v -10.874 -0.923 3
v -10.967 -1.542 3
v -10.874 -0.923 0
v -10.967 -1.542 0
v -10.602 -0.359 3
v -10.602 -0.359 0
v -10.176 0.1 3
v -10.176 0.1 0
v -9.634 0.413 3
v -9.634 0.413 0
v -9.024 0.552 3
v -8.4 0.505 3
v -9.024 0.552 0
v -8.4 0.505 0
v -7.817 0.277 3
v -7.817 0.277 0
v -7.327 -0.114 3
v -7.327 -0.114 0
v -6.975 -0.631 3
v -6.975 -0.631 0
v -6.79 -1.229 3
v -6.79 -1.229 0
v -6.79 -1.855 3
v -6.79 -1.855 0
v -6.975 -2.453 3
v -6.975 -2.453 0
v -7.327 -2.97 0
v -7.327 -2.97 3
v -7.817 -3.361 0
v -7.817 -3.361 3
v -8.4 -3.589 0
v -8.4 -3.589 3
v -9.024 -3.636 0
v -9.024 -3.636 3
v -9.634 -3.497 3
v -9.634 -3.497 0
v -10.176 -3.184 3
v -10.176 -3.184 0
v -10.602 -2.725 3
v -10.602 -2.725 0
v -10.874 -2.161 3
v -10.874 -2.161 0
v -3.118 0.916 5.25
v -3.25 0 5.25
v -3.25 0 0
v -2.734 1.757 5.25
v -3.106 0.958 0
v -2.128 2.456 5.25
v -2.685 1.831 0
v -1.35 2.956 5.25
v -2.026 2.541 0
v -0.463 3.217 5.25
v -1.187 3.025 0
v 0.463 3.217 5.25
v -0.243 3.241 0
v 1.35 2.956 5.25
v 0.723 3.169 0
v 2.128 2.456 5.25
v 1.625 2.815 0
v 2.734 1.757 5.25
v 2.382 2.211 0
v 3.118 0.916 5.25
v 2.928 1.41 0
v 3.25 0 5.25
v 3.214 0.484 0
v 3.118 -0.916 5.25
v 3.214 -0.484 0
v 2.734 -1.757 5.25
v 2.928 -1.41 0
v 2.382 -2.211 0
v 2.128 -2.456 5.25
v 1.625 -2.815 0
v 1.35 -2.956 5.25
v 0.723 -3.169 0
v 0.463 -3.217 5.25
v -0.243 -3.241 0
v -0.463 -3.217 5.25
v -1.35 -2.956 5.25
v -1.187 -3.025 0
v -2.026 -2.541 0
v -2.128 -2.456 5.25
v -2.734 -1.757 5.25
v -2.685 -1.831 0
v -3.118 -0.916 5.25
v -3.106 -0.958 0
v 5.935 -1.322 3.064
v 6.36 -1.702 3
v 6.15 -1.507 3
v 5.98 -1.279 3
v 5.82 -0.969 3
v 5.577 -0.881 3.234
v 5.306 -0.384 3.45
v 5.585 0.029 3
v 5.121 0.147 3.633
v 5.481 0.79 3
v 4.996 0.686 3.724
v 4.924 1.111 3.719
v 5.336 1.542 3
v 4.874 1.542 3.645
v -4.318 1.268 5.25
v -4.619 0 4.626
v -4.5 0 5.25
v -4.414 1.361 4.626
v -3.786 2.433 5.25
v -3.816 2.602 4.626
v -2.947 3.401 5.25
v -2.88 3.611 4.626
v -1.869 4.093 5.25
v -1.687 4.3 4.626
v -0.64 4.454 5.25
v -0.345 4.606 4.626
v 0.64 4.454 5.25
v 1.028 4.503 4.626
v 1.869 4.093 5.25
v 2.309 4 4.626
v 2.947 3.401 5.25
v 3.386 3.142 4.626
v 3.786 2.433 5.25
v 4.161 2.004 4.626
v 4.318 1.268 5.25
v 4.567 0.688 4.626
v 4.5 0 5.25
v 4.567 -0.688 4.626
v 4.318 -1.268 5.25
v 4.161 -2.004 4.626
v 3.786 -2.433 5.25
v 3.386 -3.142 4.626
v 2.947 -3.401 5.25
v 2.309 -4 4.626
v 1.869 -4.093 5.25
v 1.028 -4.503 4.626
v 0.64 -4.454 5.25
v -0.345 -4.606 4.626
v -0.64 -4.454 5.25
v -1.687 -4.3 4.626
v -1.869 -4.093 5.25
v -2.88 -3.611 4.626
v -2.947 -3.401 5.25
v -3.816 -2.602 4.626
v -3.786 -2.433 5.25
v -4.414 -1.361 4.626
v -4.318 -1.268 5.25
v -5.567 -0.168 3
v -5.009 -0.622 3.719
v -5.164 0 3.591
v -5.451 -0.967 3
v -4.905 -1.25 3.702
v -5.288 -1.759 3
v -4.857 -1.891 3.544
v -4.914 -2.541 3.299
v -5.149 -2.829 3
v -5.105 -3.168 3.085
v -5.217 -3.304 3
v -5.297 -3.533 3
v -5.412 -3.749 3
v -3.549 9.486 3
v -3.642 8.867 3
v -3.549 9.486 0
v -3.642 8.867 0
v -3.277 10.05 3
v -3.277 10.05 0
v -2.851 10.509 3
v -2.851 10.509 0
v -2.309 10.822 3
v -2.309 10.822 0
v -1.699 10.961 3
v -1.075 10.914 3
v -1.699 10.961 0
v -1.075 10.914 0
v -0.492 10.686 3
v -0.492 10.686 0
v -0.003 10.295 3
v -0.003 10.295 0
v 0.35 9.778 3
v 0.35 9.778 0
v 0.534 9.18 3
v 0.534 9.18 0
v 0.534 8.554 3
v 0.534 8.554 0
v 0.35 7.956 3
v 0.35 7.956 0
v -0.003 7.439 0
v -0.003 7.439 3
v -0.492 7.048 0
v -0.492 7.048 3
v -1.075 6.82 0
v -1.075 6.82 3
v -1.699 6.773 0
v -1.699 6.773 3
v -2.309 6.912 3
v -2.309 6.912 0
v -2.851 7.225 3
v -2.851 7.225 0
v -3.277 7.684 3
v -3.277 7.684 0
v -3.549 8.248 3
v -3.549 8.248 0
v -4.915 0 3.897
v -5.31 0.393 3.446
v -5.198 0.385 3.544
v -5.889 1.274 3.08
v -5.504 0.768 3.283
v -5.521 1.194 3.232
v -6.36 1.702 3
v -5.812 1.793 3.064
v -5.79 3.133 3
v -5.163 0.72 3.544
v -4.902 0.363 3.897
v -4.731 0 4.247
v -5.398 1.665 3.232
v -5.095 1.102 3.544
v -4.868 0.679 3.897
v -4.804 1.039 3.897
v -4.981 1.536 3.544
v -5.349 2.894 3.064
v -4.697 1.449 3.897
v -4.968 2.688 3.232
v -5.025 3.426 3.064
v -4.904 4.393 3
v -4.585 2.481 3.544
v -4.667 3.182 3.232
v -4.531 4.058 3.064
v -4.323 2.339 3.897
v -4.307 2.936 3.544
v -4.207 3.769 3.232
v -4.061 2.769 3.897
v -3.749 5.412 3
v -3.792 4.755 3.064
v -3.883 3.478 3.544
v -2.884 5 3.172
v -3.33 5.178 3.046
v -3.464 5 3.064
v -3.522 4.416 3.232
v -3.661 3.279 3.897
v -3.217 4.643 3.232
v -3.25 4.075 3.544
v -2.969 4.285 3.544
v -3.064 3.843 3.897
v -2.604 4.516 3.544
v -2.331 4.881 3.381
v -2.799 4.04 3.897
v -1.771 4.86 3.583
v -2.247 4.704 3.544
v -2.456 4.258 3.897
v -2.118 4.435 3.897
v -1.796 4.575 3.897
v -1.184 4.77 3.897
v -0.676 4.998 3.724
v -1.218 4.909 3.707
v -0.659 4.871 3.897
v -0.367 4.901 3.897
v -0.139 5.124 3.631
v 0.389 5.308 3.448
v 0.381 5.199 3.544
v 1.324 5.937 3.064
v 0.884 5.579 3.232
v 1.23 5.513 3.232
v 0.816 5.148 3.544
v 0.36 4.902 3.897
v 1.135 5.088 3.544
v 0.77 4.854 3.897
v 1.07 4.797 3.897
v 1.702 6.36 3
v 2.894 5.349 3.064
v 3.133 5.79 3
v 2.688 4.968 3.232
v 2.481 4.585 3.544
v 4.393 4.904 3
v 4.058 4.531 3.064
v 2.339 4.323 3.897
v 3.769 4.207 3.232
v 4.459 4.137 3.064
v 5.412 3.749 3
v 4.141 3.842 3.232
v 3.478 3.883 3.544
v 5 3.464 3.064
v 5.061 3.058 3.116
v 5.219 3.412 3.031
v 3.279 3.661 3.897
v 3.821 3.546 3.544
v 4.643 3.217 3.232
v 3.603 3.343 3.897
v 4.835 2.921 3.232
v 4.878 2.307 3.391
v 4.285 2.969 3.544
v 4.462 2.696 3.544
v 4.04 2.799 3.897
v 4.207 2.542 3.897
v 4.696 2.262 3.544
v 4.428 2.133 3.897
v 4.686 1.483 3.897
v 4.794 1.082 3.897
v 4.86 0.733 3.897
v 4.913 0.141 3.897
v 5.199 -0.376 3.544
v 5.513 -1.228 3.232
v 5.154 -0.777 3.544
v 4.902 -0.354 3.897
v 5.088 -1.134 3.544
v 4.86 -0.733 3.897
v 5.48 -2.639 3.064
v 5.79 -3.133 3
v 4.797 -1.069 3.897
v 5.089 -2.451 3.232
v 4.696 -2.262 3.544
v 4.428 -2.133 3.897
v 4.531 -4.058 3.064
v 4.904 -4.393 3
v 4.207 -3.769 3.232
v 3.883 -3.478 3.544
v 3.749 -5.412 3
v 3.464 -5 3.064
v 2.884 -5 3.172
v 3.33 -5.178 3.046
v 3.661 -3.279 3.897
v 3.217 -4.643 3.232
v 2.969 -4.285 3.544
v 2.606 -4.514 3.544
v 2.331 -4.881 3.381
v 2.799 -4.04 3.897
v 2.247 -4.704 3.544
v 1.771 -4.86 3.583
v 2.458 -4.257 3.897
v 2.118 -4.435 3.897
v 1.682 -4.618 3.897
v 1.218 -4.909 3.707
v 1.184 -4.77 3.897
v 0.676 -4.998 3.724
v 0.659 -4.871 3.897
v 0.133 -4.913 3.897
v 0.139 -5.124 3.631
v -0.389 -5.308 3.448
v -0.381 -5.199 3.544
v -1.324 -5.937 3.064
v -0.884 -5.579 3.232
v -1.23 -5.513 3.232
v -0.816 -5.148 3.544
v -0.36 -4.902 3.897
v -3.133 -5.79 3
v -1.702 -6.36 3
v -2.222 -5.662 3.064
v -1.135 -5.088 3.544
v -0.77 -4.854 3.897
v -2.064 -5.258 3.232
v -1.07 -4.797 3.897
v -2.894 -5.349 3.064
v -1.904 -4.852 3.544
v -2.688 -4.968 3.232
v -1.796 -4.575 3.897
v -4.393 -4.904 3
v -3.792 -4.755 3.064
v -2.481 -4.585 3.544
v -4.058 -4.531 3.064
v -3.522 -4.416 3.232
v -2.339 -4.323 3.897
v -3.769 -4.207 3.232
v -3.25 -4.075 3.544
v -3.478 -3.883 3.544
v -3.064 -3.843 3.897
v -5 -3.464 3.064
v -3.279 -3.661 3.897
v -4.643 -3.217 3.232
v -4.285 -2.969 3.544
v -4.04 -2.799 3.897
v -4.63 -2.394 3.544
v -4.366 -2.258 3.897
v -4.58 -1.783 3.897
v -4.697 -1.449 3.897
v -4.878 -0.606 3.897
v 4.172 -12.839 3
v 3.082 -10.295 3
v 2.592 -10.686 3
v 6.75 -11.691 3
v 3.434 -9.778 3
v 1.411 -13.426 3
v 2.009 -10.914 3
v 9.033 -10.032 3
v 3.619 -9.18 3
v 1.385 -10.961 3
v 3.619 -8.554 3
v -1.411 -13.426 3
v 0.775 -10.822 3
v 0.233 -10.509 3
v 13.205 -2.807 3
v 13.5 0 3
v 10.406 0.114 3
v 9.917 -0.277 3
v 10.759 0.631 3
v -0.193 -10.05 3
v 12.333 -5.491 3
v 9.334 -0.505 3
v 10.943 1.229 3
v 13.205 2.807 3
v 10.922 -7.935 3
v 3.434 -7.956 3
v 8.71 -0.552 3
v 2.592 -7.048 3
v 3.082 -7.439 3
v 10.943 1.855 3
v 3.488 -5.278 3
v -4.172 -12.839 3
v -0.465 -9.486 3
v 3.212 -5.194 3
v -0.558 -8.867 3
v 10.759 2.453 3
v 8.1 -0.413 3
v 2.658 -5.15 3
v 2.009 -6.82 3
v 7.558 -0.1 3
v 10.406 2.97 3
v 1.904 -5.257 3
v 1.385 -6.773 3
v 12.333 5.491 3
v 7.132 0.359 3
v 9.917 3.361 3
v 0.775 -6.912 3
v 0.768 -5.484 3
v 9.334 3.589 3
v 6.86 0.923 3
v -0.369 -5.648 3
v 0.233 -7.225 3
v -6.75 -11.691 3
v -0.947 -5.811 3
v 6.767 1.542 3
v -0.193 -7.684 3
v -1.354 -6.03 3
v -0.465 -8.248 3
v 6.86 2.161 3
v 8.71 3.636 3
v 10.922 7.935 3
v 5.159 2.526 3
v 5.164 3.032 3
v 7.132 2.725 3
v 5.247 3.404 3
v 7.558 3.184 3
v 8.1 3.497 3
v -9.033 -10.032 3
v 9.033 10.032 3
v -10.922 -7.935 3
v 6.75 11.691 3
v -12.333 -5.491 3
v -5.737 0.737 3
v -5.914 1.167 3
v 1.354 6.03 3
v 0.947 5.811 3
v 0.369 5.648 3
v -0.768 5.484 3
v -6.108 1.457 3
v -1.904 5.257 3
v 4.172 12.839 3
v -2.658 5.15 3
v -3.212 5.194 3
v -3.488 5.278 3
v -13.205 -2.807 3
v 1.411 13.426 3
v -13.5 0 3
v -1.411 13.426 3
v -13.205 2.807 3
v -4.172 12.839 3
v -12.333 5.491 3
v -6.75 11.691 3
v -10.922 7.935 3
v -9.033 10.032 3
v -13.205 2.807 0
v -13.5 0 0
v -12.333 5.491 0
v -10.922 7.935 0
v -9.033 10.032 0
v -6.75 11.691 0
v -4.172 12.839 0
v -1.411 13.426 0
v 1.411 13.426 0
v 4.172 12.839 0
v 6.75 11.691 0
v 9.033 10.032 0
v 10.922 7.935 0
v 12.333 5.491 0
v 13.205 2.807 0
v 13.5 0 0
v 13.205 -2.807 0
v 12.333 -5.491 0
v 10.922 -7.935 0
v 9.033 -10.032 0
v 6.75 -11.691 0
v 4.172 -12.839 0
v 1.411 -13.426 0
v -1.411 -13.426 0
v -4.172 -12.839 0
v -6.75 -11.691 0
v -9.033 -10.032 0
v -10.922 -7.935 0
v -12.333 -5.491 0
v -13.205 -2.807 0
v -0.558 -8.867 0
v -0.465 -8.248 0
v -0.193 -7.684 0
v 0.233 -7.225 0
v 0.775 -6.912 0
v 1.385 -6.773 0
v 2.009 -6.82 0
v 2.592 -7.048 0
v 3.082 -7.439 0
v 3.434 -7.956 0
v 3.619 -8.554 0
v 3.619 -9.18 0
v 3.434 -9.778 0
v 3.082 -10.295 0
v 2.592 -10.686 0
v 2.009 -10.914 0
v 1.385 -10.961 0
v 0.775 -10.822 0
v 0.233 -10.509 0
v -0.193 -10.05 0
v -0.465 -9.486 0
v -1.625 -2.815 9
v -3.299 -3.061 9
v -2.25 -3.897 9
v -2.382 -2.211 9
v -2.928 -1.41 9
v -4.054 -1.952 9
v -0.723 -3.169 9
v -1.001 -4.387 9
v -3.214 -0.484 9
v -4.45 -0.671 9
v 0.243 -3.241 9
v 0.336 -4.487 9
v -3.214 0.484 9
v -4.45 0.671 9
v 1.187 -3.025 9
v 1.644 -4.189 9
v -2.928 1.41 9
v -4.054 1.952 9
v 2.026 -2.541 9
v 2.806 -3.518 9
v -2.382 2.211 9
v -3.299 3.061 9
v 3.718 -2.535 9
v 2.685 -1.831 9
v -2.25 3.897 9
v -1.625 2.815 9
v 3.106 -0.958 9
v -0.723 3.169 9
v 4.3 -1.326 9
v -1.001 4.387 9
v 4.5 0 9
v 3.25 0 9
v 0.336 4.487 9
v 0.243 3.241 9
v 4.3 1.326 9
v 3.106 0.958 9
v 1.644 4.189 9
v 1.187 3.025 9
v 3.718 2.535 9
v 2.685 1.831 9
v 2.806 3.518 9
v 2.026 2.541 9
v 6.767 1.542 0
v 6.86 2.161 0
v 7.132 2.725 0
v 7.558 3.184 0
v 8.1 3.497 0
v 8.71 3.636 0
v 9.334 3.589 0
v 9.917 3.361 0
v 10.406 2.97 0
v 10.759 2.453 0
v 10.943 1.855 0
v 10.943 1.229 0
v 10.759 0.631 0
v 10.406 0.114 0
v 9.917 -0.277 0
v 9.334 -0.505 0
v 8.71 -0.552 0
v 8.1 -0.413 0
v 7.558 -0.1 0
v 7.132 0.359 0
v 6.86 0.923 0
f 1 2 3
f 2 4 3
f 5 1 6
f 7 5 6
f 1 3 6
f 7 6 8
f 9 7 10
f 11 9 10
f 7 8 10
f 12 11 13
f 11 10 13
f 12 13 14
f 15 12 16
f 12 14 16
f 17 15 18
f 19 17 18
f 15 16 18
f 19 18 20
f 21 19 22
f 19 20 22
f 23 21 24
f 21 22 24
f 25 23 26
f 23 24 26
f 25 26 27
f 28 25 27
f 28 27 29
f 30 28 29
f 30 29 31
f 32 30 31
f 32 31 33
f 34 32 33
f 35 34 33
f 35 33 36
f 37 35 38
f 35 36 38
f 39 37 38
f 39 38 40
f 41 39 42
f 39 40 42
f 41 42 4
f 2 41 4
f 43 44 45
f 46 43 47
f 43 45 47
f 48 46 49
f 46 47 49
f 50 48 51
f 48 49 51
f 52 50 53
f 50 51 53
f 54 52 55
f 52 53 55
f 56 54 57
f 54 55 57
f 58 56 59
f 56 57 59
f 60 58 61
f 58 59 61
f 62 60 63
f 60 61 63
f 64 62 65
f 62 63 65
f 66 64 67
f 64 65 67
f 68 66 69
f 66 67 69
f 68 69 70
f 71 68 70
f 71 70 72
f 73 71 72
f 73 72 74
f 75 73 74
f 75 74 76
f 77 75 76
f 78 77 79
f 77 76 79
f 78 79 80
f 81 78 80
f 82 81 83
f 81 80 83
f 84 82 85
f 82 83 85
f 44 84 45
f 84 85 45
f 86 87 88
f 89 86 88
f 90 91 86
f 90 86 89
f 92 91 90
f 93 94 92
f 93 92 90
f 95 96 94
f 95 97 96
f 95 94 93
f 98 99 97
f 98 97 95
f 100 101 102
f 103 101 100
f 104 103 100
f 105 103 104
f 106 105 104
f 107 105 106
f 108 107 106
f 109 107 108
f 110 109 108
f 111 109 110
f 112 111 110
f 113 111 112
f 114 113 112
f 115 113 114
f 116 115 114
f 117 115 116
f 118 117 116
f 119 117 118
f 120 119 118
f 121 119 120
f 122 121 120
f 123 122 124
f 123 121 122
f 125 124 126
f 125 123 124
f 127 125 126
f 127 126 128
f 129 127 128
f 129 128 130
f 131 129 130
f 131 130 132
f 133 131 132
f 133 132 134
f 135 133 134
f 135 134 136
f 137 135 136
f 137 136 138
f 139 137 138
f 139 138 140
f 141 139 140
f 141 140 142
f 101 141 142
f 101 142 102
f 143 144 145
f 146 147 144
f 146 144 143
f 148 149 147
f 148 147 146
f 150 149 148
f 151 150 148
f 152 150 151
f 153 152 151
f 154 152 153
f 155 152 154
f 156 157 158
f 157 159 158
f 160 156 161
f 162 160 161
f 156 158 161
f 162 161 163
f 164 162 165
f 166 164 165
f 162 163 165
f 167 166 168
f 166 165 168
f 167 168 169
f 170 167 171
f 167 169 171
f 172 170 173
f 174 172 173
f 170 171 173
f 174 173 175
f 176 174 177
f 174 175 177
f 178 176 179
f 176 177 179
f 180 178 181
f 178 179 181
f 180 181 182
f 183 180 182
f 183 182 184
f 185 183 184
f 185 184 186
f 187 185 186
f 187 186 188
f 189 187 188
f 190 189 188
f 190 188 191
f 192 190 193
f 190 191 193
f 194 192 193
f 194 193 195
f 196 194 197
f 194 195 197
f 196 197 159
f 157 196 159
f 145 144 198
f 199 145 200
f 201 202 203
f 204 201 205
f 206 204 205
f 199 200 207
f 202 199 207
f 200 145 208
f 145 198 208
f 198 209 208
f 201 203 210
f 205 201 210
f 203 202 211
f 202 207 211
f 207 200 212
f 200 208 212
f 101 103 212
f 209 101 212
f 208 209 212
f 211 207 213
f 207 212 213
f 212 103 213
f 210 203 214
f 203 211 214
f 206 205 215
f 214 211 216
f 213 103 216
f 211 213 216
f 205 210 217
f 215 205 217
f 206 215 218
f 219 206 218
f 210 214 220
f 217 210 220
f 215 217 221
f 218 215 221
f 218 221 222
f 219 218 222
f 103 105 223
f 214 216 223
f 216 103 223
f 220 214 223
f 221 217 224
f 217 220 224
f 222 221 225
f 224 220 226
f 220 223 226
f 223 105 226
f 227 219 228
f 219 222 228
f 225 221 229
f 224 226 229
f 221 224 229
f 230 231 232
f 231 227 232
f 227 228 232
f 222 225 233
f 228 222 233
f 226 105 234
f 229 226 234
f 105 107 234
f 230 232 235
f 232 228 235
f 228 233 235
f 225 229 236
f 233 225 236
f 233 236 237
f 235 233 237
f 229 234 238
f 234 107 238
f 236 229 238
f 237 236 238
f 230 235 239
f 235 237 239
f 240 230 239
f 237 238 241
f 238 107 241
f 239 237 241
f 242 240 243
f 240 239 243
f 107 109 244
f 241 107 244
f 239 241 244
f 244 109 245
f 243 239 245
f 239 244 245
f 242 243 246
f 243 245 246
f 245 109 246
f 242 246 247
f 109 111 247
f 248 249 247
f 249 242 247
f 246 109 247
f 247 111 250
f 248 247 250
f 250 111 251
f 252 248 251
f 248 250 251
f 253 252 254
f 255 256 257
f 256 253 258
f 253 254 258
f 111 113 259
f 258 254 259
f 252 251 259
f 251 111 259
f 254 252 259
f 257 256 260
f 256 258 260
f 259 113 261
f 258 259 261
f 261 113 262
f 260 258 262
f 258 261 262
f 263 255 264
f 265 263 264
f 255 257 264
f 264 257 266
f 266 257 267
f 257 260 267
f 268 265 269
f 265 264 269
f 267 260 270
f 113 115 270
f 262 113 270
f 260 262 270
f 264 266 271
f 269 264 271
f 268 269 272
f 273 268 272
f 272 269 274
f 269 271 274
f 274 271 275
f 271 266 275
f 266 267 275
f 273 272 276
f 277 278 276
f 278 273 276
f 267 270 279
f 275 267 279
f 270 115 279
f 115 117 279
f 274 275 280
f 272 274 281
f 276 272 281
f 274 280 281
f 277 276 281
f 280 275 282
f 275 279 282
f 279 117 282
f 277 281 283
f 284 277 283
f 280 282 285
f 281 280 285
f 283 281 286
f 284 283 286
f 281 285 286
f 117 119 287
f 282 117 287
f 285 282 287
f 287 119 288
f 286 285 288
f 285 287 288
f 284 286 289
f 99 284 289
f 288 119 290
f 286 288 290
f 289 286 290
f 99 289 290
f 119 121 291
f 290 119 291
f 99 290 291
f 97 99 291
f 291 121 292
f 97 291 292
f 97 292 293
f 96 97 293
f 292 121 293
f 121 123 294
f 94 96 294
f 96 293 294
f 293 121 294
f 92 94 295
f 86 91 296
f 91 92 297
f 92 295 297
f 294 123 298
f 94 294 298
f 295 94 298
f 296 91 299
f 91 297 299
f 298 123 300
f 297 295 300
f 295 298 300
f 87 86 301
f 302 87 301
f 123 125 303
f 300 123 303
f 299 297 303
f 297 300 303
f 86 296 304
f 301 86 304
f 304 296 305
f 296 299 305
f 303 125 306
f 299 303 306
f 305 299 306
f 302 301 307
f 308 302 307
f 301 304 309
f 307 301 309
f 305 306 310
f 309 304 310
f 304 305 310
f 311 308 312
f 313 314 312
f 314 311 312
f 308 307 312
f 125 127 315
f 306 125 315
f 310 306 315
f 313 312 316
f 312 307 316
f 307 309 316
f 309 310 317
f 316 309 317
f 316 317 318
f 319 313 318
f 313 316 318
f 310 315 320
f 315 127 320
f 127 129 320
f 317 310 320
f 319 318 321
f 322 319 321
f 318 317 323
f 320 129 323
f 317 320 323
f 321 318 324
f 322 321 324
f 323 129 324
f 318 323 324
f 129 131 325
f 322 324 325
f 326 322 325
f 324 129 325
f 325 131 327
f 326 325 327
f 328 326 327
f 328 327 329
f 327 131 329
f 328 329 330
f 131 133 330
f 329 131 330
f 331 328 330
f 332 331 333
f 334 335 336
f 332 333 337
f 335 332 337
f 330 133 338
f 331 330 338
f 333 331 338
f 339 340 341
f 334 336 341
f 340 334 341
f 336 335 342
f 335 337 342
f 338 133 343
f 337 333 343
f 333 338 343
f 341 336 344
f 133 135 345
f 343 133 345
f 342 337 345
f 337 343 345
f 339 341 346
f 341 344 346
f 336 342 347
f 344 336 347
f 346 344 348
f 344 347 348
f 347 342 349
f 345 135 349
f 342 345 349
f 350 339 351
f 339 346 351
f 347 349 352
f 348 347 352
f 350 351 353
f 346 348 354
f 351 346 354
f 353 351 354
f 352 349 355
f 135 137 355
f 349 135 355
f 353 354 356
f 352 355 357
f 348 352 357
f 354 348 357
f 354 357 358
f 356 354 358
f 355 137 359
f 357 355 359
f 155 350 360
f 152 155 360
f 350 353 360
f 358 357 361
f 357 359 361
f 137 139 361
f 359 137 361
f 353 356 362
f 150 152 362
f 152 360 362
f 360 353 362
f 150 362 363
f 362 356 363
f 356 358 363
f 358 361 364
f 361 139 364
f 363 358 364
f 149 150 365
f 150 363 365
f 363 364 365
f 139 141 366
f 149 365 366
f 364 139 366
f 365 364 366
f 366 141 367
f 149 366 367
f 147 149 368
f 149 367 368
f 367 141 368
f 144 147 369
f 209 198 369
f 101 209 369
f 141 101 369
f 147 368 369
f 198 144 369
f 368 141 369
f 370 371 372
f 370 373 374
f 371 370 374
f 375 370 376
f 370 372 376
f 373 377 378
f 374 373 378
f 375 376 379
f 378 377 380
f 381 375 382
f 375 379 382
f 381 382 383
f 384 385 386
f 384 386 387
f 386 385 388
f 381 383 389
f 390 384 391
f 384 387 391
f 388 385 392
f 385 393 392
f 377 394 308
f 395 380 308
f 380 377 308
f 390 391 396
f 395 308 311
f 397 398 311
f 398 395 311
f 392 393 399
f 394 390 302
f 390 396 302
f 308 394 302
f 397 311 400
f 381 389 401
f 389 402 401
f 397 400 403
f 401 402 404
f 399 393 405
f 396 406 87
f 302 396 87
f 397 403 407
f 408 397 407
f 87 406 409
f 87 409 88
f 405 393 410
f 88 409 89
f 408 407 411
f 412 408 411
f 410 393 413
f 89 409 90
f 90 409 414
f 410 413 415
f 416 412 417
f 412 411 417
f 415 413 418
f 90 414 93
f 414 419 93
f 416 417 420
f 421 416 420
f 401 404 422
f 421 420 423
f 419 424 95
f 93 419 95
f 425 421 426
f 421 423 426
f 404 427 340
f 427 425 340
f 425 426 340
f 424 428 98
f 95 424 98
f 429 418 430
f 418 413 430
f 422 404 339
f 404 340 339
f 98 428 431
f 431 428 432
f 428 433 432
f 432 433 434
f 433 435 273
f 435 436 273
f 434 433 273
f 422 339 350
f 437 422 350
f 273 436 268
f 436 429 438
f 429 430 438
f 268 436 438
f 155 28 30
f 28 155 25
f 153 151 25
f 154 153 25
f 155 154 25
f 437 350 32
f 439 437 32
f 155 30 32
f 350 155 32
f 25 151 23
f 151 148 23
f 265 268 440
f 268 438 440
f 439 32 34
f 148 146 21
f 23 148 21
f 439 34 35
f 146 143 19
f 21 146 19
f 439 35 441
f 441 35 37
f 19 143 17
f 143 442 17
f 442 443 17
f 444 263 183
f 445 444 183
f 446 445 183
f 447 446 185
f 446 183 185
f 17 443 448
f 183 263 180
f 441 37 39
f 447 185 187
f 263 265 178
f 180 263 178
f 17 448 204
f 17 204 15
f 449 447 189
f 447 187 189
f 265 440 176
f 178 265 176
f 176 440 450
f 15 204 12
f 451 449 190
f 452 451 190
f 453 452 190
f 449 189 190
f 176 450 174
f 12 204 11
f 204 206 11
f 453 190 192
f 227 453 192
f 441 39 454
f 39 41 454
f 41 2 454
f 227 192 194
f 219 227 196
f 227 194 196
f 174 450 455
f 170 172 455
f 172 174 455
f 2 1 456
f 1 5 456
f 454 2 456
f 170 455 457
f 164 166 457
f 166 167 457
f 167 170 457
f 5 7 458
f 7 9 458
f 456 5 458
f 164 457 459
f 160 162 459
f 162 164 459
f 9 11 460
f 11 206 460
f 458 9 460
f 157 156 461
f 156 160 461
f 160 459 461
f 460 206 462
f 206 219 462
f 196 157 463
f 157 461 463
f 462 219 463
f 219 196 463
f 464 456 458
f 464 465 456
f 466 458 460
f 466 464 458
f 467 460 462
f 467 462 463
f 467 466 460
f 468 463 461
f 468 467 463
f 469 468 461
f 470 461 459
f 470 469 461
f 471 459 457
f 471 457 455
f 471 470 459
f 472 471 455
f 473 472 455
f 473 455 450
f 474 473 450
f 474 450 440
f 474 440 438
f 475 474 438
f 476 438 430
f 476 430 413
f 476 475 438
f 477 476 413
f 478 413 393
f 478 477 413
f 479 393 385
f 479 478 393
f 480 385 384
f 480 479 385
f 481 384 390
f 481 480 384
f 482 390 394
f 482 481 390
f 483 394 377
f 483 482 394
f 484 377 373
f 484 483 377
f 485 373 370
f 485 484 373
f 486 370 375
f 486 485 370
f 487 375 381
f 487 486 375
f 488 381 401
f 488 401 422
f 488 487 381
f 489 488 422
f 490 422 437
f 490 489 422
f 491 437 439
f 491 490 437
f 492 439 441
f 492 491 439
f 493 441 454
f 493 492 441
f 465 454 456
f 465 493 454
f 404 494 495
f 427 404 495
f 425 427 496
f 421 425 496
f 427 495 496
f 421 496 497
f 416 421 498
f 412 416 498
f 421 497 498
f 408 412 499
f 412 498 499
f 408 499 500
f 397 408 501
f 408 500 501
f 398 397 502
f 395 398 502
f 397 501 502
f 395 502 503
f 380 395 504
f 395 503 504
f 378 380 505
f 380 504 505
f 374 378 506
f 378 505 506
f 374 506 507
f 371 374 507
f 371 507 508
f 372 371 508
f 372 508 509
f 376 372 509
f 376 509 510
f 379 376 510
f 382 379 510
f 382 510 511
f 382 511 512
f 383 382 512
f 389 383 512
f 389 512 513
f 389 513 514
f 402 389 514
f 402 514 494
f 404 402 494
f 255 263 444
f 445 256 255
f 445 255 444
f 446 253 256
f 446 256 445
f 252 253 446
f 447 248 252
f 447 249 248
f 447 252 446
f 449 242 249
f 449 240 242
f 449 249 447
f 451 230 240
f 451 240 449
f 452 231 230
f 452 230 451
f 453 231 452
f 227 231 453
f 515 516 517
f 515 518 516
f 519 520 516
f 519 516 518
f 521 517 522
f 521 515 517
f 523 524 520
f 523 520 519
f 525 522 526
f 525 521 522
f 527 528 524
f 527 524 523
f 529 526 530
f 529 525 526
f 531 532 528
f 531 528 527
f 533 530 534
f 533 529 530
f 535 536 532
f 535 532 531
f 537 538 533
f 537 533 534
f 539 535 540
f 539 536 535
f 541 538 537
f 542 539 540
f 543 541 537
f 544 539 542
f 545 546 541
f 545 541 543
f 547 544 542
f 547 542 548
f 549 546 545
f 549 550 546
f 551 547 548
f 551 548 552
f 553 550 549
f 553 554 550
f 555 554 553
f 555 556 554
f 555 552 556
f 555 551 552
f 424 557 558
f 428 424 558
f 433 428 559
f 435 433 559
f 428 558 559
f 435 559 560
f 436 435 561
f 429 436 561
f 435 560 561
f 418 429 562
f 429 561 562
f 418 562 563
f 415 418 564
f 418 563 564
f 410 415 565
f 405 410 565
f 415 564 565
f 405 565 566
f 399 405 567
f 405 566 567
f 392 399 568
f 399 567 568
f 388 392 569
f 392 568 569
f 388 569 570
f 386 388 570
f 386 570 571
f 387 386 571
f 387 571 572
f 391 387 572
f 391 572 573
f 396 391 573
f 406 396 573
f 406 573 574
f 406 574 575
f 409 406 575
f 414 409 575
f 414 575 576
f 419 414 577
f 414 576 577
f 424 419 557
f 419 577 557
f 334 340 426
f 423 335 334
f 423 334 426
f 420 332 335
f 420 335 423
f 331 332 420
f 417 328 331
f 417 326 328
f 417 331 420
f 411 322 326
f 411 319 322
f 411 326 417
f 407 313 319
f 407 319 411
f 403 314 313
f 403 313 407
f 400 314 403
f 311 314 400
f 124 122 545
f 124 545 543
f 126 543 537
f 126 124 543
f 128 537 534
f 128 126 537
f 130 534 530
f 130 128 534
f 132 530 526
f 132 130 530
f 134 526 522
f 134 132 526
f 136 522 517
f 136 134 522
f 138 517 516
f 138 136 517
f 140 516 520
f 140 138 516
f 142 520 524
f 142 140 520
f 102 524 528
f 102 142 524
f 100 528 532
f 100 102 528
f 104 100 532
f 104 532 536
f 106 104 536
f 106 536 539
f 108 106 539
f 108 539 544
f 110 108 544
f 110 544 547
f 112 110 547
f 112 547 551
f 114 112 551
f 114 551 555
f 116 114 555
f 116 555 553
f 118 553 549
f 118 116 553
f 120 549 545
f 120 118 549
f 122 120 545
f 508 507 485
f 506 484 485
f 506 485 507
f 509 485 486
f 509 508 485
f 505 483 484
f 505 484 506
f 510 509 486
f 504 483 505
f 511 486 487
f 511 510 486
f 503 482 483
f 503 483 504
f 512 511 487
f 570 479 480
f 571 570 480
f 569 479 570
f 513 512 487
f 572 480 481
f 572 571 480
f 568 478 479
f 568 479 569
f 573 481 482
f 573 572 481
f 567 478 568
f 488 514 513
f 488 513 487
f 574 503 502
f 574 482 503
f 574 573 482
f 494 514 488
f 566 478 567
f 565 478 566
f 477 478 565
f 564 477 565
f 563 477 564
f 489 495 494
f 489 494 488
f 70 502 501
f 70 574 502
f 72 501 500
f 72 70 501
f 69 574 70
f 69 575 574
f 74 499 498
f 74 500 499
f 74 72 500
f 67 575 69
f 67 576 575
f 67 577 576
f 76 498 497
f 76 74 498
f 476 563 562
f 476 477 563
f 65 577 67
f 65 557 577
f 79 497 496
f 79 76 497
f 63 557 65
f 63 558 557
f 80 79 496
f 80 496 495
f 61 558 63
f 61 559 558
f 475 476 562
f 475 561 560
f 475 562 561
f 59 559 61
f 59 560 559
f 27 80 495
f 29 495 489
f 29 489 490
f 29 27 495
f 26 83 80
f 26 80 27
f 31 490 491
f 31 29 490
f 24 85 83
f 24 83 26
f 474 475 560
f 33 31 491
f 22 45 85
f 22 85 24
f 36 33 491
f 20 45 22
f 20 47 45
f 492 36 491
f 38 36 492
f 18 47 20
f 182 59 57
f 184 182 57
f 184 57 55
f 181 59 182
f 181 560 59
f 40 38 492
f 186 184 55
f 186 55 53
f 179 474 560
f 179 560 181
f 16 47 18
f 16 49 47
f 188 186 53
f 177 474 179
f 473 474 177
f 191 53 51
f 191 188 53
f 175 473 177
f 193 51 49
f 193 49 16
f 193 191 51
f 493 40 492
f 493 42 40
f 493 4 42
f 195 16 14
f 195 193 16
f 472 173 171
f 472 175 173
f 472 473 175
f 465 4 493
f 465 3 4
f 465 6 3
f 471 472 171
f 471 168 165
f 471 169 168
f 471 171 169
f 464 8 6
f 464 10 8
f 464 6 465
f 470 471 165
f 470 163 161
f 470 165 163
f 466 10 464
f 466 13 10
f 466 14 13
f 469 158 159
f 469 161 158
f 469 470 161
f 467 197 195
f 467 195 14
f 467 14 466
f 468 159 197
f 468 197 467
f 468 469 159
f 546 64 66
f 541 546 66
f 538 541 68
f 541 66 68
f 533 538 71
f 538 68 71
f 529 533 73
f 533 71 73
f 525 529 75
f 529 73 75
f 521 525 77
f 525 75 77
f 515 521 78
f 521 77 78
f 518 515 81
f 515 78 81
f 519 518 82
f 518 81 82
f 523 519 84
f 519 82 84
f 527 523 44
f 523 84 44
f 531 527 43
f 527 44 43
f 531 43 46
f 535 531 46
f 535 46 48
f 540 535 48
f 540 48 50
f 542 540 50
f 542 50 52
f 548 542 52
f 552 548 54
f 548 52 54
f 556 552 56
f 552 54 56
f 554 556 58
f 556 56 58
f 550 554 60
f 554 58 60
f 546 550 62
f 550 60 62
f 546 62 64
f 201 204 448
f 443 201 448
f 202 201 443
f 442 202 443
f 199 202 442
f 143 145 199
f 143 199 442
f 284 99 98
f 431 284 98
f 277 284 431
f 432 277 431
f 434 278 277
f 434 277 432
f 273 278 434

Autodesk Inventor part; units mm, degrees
ref_plane "YZ Plane" through (0, 0, 0) normal (1, 0, 0) x (0, 1, 0)
ref_plane "XZ Plane" through (0, 0, 0) normal (0, 1, 0) x (-1, 0, 0)
ref_plane "XY Plane" through (0, 0, 0) normal (0, 0, 1) x (1, 0, 0)
sketch "Эскиз1" plane through (0, 0, 0) normal (0, 0, 1) x (1, 0, 0)
  circle A0 centre (0, 0) radius 3.25
  circle A1 centre (0, 0) radius 4.5
  dimension "d0" = 6.5
  dimension "d1" = 9
extrude "Выдавливание1" add sketch "Эскиз1" along normal blind 5.25
sketch "Эскиз2" plane through (0, 0, 0) normal (0, 0, -1) x (-1, 0, 0)
  circle A0 centre (0, 0) radius 5.5
  dimension "d4" = 11
loft "Лофт1" add profiles "Эскиз2" section 2 edges at (-4.5, 0, 5.25)
sketch "Эскиз4" plane through (0, 0, 0) normal (0, 0, -1) x (-1, 0, 0)
  circle A0 centre (0, 0) radius 3.25
  dimension "d10" = 6.5
extrude "Выдавливание2" cut sketch "Эскиз4" against normal through all
sketch "Эскиз5" plane through (0, 0, 0) normal (0, 0, -1) x (-1, 0, 0)
  circle A0 centre (-8.8669, 1.5421) radius 2.1 projected
  circle A1 centre (-1.5421, -8.8669) radius 2.1 projected
  circle A2 centre (1.5421, 8.8669) radius 2.1 projected
  circle A3 centre (8.8669, -1.5421) radius 2.1 projected
  circle A4 centre (0, 0) radius 13.5
  circle A5 centre (0, 0) radius 3.25 projected
  dimension "d13" = 27
extrude "Выдавливание3" add sketch "Эскиз5" against normal blind 3
fillet "Сопряжение1" radius 2 1 edges at (4.9286, 0, 3)
chamfer "Фаска1" distance 2 angle 45 4 edges at (0.5579, 8.8669, 3) (10.9669, 1.5421, 3) (-6.7669, -1.5421, 3) (3.6421, -8.8669, 3)
sketch "Эскиз6" plane through (0, 0, 0) normal (0, 0, -1) x (-1, 0, 0)
  circle A0 centre (0, 0) radius 13.5 projected
  circle A1 centre (8.8669, -1.5421) radius 2.1 projected
  circle A2 centre (1.5421, 8.8669) radius 2.1 projected
  circle A3 centre (-1.5421, -8.8669) radius 2.1 projected
  circle A4 centre (-8.8669, 1.5421) radius 2.1 projected
  circle A5 centre (0, 0) radius 3.25 projected
extrude "Выдавливание4" add sketch "Эскиз6" against normal blind 3
sketch "Эскиз8" plane through (0, 0, 3) normal (0, 0, 1) x (1, 0, 0)
  point P0 (0, 0)
sketch "Эскиз9" plane through (0, 0, 5.25) normal (0, 0, 1) x (1, 0, 0)
  circle A0 centre (0, 0) radius 4.5
  circle A1 centre (0, 0) radius 3.25
extrude "Выдавливание6" add sketch "Эскиз9" along normal blind 3.75
properties part number "втулка для крепл 3" material "Пластик ПЭТ"
